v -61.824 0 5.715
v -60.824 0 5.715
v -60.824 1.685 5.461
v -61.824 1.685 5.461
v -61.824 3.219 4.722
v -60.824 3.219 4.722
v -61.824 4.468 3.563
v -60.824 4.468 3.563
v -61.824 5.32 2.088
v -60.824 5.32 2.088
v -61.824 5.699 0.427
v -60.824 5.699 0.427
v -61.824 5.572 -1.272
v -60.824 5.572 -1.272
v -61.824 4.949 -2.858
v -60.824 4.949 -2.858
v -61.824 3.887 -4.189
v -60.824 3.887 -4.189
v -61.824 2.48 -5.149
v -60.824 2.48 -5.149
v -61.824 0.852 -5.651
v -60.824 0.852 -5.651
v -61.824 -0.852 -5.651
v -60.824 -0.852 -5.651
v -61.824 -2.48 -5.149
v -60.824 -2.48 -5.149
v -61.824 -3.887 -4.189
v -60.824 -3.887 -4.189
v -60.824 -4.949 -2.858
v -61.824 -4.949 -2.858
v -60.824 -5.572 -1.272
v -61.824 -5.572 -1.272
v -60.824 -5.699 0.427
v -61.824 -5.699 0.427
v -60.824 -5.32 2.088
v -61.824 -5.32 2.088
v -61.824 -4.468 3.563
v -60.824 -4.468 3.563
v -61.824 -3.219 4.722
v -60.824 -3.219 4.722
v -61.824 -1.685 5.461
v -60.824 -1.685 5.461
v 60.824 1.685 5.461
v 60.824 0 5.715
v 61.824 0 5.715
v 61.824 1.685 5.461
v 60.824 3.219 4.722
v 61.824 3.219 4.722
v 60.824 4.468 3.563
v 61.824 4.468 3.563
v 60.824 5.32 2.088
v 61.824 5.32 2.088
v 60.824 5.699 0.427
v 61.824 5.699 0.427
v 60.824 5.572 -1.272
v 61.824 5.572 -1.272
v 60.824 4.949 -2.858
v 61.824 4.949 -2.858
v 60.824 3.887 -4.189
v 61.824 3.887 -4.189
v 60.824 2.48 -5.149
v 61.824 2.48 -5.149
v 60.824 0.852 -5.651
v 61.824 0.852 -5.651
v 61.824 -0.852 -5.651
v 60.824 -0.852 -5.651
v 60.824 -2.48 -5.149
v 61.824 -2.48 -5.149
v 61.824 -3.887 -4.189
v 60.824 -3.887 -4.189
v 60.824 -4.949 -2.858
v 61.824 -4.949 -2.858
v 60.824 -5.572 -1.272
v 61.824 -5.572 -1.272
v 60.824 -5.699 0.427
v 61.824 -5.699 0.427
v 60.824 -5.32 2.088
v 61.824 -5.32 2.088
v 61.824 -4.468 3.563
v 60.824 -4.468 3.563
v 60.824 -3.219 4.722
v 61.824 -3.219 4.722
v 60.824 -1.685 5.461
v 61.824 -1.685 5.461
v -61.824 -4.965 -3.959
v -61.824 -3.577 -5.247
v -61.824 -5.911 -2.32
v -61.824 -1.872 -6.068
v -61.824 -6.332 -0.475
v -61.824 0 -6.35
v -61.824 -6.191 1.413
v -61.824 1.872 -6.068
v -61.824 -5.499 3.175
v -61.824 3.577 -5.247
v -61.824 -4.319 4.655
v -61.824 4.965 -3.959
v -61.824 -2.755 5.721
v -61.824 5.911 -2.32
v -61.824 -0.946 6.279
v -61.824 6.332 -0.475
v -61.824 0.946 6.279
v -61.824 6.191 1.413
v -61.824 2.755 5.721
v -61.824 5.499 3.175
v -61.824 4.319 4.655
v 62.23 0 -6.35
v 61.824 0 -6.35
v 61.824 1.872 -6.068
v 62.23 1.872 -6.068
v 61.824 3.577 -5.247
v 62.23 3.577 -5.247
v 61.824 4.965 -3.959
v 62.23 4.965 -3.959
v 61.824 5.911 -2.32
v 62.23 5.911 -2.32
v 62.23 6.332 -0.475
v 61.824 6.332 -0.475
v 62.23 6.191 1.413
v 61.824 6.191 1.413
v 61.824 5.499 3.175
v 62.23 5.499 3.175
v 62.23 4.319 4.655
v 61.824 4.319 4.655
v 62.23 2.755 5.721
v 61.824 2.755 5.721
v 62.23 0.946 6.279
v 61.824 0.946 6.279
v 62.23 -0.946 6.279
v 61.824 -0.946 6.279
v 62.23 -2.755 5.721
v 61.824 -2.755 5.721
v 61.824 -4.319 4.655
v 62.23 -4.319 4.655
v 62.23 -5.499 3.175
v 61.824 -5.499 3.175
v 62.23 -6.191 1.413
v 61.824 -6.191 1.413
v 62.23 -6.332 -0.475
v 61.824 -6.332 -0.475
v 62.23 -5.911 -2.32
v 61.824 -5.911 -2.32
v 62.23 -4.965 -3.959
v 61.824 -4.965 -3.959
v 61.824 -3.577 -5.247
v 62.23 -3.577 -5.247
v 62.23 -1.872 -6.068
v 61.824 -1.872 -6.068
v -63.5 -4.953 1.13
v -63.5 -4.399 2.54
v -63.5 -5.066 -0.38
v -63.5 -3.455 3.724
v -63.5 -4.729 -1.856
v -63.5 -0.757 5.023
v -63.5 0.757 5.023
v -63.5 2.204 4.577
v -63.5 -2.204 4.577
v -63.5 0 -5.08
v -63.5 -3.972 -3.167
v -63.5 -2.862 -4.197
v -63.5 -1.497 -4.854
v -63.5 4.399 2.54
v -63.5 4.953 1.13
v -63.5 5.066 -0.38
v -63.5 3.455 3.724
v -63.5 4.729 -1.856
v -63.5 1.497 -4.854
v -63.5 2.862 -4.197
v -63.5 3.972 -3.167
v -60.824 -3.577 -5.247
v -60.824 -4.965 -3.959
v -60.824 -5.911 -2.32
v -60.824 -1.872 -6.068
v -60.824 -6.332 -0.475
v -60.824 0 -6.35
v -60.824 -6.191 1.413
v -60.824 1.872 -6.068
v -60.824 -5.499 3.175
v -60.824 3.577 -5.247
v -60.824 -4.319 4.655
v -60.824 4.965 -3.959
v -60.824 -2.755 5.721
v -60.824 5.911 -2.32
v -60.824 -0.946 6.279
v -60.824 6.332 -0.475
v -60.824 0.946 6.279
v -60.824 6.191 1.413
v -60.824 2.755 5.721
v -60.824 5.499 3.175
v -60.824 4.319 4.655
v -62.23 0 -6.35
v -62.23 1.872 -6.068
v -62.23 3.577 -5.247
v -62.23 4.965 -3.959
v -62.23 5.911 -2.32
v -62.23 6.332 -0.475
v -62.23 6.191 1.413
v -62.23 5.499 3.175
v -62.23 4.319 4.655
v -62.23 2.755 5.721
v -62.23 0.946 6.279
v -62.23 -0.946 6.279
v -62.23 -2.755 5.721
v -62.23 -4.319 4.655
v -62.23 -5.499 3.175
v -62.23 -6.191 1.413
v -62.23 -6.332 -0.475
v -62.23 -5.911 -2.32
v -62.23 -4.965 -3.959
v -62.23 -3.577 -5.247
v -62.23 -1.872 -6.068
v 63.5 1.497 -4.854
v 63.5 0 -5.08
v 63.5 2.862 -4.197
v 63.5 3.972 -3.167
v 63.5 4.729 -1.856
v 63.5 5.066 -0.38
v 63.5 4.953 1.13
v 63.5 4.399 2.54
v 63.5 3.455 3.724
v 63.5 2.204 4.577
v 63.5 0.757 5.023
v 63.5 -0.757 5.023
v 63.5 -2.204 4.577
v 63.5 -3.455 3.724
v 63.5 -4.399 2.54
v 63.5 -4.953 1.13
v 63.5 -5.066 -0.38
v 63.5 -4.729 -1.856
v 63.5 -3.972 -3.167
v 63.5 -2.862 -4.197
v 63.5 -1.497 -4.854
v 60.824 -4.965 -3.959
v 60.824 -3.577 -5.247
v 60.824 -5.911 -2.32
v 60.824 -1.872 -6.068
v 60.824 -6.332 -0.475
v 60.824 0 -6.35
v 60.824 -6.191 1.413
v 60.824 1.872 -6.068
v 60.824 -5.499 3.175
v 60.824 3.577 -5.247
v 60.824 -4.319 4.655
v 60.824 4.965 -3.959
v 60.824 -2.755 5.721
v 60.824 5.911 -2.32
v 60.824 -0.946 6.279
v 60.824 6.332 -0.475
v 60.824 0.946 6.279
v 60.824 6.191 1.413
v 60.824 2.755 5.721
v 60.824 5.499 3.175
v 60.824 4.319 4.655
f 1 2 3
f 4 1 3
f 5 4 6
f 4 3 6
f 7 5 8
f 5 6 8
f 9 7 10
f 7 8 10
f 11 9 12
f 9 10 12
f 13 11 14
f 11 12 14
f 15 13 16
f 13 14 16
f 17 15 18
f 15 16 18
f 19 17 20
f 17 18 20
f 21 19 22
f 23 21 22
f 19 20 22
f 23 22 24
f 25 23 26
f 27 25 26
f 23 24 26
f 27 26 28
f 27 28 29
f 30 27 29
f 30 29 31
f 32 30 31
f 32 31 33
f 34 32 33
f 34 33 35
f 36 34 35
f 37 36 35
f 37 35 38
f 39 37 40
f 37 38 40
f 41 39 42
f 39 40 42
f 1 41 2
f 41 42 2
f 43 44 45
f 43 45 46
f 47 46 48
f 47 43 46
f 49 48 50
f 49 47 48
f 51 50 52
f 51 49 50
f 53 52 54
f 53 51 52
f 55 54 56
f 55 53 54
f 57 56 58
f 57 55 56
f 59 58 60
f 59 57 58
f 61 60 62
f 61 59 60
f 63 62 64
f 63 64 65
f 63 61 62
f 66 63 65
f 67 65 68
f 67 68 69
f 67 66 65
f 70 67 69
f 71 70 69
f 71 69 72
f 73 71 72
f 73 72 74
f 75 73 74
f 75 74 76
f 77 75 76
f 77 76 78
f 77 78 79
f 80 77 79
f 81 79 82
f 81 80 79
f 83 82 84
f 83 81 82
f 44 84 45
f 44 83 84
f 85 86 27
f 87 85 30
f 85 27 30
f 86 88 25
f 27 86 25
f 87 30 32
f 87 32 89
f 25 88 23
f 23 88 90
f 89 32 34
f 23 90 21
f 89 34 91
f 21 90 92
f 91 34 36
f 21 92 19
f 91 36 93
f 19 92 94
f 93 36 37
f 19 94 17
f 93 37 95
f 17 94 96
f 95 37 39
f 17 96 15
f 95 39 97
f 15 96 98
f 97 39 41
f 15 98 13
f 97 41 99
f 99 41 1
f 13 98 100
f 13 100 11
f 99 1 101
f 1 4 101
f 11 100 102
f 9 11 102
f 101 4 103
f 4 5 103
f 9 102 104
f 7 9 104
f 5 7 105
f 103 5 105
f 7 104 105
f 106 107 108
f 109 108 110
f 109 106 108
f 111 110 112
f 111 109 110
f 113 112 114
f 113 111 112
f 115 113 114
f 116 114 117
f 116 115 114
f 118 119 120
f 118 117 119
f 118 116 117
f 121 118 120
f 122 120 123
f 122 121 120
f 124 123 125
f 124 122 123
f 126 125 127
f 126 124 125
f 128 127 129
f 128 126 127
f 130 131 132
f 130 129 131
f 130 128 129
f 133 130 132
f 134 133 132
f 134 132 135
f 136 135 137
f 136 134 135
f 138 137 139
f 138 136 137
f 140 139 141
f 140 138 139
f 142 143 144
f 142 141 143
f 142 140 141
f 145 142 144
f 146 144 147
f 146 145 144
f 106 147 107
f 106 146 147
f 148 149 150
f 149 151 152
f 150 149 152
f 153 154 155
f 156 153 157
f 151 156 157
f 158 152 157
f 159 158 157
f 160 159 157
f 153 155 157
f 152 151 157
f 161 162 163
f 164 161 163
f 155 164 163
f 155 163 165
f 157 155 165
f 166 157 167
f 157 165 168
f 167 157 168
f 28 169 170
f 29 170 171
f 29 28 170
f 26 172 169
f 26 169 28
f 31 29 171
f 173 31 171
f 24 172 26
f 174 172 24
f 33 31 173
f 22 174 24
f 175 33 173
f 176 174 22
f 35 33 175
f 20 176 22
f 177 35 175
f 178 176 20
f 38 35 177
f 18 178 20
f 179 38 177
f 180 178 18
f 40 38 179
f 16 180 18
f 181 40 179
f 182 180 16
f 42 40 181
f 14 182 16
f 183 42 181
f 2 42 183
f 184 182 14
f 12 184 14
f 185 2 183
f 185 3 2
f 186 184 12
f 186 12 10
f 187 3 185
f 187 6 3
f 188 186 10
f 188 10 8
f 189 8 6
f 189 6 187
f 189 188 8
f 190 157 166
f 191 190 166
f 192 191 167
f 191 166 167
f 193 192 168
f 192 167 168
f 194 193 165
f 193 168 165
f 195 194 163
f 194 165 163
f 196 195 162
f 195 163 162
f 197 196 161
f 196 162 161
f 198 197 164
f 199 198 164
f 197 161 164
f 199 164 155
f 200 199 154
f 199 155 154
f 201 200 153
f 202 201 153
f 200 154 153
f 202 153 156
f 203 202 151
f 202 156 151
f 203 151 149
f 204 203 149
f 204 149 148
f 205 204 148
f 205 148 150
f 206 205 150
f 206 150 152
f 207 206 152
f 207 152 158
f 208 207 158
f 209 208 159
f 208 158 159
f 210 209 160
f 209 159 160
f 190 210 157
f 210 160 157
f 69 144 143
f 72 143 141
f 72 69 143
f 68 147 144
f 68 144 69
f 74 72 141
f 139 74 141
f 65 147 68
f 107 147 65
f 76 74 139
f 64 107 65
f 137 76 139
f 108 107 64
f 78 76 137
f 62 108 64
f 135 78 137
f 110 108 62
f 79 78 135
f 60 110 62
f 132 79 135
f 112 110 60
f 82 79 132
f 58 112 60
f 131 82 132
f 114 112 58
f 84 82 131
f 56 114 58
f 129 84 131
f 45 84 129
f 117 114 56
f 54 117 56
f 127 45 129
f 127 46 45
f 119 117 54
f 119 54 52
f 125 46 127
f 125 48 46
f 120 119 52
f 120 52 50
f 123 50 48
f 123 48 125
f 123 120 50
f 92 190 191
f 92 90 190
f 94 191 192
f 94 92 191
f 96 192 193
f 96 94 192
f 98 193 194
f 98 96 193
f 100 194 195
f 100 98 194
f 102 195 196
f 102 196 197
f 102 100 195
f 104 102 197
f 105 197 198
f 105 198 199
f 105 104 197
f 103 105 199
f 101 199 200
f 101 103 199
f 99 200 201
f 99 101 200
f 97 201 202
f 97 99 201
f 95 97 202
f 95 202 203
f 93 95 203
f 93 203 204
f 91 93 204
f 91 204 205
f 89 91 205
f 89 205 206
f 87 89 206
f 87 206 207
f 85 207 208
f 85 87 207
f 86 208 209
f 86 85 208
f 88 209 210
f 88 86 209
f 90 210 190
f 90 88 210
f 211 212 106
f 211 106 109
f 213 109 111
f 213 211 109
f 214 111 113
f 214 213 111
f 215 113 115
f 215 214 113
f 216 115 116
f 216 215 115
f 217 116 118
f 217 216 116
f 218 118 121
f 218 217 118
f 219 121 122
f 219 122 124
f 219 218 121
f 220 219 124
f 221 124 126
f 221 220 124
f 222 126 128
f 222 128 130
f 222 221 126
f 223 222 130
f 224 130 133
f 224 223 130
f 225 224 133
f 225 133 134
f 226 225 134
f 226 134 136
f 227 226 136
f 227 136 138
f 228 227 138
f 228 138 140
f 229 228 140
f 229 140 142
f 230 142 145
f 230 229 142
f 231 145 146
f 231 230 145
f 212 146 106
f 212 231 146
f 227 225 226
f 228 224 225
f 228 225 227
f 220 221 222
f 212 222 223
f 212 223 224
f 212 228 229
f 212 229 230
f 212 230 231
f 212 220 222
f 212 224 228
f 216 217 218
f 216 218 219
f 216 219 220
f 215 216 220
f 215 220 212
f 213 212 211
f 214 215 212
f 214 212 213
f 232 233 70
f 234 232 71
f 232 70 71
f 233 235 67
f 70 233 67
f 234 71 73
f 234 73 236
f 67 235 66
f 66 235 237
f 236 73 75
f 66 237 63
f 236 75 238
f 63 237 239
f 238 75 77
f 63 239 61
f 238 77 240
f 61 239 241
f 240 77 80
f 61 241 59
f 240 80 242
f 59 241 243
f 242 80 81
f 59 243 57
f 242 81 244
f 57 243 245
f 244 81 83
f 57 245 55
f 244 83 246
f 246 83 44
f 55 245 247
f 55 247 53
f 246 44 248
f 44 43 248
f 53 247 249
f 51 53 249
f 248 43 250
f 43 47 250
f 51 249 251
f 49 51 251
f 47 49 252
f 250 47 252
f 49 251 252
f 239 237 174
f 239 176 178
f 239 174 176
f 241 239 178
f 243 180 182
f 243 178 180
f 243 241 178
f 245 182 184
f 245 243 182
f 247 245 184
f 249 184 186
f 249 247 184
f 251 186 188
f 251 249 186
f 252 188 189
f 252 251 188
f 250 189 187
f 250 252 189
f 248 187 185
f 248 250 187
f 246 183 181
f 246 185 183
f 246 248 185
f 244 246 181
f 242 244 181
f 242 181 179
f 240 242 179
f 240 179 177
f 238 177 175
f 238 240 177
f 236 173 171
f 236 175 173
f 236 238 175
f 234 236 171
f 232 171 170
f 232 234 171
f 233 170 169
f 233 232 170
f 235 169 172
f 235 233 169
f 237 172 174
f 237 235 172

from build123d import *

# Parameters (mm, degrees)
SKETCH2_R           = 6.35
EXTRUDE1_DEPTH      = 63.5
EXTRUDE1_DEPTH_BACK = 63.5
CHAMFER1_SIZE       = 1.27
CUT_EXTRUDE1_START  = 0.5
SKETCH3_R           = 6.35
SKETCH3_R_2         = 5.715
CUT_EXTRUDE1_DEPTH  = 1


with BuildPart() as part:
    # Sketch2 → Extrude1 (new body, two sides)
    with BuildSketch(Plane(origin=(0, 0, 0), x_dir=(0, 0, -1), z_dir=(1, 0, 0))) as extrude1_sk:
        Circle(SKETCH2_R)
    extrude(amount=EXTRUDE1_DEPTH)
    extrude(extrude1_sk.sketch, amount=-EXTRUDE1_DEPTH_BACK)

    # Chamfer1
    chamfer1_edges = [part.edges().sort_by_distance(p)[0] for p in [
        (-63.5, 0, 6.35),
        (63.5, 0, 6.35),
    ]]
    chamfer(chamfer1_edges, length=CHAMFER1_SIZE)

    # Sketch3 → Cut-Extrude1 (cut)
    with BuildSketch(Plane.ZY.offset(60.323942702).offset(CUT_EXTRUDE1_START)):
        Circle(SKETCH3_R)
        Circle(SKETCH3_R_2, mode=Mode.SUBTRACT)
    cut_extrude1 = extrude(amount=CUT_EXTRUDE1_DEPTH, mode=Mode.SUBTRACT)

    # Mirror1: Cut-Extrude1 across plane
    add(cut_extrude1.mirror(Plane(origin=(0, 0, 0), x_dir=(0, 0, 1), z_dir=(1, 0, 0))), mode=Mode.SUBTRACT)


solid = part.part
